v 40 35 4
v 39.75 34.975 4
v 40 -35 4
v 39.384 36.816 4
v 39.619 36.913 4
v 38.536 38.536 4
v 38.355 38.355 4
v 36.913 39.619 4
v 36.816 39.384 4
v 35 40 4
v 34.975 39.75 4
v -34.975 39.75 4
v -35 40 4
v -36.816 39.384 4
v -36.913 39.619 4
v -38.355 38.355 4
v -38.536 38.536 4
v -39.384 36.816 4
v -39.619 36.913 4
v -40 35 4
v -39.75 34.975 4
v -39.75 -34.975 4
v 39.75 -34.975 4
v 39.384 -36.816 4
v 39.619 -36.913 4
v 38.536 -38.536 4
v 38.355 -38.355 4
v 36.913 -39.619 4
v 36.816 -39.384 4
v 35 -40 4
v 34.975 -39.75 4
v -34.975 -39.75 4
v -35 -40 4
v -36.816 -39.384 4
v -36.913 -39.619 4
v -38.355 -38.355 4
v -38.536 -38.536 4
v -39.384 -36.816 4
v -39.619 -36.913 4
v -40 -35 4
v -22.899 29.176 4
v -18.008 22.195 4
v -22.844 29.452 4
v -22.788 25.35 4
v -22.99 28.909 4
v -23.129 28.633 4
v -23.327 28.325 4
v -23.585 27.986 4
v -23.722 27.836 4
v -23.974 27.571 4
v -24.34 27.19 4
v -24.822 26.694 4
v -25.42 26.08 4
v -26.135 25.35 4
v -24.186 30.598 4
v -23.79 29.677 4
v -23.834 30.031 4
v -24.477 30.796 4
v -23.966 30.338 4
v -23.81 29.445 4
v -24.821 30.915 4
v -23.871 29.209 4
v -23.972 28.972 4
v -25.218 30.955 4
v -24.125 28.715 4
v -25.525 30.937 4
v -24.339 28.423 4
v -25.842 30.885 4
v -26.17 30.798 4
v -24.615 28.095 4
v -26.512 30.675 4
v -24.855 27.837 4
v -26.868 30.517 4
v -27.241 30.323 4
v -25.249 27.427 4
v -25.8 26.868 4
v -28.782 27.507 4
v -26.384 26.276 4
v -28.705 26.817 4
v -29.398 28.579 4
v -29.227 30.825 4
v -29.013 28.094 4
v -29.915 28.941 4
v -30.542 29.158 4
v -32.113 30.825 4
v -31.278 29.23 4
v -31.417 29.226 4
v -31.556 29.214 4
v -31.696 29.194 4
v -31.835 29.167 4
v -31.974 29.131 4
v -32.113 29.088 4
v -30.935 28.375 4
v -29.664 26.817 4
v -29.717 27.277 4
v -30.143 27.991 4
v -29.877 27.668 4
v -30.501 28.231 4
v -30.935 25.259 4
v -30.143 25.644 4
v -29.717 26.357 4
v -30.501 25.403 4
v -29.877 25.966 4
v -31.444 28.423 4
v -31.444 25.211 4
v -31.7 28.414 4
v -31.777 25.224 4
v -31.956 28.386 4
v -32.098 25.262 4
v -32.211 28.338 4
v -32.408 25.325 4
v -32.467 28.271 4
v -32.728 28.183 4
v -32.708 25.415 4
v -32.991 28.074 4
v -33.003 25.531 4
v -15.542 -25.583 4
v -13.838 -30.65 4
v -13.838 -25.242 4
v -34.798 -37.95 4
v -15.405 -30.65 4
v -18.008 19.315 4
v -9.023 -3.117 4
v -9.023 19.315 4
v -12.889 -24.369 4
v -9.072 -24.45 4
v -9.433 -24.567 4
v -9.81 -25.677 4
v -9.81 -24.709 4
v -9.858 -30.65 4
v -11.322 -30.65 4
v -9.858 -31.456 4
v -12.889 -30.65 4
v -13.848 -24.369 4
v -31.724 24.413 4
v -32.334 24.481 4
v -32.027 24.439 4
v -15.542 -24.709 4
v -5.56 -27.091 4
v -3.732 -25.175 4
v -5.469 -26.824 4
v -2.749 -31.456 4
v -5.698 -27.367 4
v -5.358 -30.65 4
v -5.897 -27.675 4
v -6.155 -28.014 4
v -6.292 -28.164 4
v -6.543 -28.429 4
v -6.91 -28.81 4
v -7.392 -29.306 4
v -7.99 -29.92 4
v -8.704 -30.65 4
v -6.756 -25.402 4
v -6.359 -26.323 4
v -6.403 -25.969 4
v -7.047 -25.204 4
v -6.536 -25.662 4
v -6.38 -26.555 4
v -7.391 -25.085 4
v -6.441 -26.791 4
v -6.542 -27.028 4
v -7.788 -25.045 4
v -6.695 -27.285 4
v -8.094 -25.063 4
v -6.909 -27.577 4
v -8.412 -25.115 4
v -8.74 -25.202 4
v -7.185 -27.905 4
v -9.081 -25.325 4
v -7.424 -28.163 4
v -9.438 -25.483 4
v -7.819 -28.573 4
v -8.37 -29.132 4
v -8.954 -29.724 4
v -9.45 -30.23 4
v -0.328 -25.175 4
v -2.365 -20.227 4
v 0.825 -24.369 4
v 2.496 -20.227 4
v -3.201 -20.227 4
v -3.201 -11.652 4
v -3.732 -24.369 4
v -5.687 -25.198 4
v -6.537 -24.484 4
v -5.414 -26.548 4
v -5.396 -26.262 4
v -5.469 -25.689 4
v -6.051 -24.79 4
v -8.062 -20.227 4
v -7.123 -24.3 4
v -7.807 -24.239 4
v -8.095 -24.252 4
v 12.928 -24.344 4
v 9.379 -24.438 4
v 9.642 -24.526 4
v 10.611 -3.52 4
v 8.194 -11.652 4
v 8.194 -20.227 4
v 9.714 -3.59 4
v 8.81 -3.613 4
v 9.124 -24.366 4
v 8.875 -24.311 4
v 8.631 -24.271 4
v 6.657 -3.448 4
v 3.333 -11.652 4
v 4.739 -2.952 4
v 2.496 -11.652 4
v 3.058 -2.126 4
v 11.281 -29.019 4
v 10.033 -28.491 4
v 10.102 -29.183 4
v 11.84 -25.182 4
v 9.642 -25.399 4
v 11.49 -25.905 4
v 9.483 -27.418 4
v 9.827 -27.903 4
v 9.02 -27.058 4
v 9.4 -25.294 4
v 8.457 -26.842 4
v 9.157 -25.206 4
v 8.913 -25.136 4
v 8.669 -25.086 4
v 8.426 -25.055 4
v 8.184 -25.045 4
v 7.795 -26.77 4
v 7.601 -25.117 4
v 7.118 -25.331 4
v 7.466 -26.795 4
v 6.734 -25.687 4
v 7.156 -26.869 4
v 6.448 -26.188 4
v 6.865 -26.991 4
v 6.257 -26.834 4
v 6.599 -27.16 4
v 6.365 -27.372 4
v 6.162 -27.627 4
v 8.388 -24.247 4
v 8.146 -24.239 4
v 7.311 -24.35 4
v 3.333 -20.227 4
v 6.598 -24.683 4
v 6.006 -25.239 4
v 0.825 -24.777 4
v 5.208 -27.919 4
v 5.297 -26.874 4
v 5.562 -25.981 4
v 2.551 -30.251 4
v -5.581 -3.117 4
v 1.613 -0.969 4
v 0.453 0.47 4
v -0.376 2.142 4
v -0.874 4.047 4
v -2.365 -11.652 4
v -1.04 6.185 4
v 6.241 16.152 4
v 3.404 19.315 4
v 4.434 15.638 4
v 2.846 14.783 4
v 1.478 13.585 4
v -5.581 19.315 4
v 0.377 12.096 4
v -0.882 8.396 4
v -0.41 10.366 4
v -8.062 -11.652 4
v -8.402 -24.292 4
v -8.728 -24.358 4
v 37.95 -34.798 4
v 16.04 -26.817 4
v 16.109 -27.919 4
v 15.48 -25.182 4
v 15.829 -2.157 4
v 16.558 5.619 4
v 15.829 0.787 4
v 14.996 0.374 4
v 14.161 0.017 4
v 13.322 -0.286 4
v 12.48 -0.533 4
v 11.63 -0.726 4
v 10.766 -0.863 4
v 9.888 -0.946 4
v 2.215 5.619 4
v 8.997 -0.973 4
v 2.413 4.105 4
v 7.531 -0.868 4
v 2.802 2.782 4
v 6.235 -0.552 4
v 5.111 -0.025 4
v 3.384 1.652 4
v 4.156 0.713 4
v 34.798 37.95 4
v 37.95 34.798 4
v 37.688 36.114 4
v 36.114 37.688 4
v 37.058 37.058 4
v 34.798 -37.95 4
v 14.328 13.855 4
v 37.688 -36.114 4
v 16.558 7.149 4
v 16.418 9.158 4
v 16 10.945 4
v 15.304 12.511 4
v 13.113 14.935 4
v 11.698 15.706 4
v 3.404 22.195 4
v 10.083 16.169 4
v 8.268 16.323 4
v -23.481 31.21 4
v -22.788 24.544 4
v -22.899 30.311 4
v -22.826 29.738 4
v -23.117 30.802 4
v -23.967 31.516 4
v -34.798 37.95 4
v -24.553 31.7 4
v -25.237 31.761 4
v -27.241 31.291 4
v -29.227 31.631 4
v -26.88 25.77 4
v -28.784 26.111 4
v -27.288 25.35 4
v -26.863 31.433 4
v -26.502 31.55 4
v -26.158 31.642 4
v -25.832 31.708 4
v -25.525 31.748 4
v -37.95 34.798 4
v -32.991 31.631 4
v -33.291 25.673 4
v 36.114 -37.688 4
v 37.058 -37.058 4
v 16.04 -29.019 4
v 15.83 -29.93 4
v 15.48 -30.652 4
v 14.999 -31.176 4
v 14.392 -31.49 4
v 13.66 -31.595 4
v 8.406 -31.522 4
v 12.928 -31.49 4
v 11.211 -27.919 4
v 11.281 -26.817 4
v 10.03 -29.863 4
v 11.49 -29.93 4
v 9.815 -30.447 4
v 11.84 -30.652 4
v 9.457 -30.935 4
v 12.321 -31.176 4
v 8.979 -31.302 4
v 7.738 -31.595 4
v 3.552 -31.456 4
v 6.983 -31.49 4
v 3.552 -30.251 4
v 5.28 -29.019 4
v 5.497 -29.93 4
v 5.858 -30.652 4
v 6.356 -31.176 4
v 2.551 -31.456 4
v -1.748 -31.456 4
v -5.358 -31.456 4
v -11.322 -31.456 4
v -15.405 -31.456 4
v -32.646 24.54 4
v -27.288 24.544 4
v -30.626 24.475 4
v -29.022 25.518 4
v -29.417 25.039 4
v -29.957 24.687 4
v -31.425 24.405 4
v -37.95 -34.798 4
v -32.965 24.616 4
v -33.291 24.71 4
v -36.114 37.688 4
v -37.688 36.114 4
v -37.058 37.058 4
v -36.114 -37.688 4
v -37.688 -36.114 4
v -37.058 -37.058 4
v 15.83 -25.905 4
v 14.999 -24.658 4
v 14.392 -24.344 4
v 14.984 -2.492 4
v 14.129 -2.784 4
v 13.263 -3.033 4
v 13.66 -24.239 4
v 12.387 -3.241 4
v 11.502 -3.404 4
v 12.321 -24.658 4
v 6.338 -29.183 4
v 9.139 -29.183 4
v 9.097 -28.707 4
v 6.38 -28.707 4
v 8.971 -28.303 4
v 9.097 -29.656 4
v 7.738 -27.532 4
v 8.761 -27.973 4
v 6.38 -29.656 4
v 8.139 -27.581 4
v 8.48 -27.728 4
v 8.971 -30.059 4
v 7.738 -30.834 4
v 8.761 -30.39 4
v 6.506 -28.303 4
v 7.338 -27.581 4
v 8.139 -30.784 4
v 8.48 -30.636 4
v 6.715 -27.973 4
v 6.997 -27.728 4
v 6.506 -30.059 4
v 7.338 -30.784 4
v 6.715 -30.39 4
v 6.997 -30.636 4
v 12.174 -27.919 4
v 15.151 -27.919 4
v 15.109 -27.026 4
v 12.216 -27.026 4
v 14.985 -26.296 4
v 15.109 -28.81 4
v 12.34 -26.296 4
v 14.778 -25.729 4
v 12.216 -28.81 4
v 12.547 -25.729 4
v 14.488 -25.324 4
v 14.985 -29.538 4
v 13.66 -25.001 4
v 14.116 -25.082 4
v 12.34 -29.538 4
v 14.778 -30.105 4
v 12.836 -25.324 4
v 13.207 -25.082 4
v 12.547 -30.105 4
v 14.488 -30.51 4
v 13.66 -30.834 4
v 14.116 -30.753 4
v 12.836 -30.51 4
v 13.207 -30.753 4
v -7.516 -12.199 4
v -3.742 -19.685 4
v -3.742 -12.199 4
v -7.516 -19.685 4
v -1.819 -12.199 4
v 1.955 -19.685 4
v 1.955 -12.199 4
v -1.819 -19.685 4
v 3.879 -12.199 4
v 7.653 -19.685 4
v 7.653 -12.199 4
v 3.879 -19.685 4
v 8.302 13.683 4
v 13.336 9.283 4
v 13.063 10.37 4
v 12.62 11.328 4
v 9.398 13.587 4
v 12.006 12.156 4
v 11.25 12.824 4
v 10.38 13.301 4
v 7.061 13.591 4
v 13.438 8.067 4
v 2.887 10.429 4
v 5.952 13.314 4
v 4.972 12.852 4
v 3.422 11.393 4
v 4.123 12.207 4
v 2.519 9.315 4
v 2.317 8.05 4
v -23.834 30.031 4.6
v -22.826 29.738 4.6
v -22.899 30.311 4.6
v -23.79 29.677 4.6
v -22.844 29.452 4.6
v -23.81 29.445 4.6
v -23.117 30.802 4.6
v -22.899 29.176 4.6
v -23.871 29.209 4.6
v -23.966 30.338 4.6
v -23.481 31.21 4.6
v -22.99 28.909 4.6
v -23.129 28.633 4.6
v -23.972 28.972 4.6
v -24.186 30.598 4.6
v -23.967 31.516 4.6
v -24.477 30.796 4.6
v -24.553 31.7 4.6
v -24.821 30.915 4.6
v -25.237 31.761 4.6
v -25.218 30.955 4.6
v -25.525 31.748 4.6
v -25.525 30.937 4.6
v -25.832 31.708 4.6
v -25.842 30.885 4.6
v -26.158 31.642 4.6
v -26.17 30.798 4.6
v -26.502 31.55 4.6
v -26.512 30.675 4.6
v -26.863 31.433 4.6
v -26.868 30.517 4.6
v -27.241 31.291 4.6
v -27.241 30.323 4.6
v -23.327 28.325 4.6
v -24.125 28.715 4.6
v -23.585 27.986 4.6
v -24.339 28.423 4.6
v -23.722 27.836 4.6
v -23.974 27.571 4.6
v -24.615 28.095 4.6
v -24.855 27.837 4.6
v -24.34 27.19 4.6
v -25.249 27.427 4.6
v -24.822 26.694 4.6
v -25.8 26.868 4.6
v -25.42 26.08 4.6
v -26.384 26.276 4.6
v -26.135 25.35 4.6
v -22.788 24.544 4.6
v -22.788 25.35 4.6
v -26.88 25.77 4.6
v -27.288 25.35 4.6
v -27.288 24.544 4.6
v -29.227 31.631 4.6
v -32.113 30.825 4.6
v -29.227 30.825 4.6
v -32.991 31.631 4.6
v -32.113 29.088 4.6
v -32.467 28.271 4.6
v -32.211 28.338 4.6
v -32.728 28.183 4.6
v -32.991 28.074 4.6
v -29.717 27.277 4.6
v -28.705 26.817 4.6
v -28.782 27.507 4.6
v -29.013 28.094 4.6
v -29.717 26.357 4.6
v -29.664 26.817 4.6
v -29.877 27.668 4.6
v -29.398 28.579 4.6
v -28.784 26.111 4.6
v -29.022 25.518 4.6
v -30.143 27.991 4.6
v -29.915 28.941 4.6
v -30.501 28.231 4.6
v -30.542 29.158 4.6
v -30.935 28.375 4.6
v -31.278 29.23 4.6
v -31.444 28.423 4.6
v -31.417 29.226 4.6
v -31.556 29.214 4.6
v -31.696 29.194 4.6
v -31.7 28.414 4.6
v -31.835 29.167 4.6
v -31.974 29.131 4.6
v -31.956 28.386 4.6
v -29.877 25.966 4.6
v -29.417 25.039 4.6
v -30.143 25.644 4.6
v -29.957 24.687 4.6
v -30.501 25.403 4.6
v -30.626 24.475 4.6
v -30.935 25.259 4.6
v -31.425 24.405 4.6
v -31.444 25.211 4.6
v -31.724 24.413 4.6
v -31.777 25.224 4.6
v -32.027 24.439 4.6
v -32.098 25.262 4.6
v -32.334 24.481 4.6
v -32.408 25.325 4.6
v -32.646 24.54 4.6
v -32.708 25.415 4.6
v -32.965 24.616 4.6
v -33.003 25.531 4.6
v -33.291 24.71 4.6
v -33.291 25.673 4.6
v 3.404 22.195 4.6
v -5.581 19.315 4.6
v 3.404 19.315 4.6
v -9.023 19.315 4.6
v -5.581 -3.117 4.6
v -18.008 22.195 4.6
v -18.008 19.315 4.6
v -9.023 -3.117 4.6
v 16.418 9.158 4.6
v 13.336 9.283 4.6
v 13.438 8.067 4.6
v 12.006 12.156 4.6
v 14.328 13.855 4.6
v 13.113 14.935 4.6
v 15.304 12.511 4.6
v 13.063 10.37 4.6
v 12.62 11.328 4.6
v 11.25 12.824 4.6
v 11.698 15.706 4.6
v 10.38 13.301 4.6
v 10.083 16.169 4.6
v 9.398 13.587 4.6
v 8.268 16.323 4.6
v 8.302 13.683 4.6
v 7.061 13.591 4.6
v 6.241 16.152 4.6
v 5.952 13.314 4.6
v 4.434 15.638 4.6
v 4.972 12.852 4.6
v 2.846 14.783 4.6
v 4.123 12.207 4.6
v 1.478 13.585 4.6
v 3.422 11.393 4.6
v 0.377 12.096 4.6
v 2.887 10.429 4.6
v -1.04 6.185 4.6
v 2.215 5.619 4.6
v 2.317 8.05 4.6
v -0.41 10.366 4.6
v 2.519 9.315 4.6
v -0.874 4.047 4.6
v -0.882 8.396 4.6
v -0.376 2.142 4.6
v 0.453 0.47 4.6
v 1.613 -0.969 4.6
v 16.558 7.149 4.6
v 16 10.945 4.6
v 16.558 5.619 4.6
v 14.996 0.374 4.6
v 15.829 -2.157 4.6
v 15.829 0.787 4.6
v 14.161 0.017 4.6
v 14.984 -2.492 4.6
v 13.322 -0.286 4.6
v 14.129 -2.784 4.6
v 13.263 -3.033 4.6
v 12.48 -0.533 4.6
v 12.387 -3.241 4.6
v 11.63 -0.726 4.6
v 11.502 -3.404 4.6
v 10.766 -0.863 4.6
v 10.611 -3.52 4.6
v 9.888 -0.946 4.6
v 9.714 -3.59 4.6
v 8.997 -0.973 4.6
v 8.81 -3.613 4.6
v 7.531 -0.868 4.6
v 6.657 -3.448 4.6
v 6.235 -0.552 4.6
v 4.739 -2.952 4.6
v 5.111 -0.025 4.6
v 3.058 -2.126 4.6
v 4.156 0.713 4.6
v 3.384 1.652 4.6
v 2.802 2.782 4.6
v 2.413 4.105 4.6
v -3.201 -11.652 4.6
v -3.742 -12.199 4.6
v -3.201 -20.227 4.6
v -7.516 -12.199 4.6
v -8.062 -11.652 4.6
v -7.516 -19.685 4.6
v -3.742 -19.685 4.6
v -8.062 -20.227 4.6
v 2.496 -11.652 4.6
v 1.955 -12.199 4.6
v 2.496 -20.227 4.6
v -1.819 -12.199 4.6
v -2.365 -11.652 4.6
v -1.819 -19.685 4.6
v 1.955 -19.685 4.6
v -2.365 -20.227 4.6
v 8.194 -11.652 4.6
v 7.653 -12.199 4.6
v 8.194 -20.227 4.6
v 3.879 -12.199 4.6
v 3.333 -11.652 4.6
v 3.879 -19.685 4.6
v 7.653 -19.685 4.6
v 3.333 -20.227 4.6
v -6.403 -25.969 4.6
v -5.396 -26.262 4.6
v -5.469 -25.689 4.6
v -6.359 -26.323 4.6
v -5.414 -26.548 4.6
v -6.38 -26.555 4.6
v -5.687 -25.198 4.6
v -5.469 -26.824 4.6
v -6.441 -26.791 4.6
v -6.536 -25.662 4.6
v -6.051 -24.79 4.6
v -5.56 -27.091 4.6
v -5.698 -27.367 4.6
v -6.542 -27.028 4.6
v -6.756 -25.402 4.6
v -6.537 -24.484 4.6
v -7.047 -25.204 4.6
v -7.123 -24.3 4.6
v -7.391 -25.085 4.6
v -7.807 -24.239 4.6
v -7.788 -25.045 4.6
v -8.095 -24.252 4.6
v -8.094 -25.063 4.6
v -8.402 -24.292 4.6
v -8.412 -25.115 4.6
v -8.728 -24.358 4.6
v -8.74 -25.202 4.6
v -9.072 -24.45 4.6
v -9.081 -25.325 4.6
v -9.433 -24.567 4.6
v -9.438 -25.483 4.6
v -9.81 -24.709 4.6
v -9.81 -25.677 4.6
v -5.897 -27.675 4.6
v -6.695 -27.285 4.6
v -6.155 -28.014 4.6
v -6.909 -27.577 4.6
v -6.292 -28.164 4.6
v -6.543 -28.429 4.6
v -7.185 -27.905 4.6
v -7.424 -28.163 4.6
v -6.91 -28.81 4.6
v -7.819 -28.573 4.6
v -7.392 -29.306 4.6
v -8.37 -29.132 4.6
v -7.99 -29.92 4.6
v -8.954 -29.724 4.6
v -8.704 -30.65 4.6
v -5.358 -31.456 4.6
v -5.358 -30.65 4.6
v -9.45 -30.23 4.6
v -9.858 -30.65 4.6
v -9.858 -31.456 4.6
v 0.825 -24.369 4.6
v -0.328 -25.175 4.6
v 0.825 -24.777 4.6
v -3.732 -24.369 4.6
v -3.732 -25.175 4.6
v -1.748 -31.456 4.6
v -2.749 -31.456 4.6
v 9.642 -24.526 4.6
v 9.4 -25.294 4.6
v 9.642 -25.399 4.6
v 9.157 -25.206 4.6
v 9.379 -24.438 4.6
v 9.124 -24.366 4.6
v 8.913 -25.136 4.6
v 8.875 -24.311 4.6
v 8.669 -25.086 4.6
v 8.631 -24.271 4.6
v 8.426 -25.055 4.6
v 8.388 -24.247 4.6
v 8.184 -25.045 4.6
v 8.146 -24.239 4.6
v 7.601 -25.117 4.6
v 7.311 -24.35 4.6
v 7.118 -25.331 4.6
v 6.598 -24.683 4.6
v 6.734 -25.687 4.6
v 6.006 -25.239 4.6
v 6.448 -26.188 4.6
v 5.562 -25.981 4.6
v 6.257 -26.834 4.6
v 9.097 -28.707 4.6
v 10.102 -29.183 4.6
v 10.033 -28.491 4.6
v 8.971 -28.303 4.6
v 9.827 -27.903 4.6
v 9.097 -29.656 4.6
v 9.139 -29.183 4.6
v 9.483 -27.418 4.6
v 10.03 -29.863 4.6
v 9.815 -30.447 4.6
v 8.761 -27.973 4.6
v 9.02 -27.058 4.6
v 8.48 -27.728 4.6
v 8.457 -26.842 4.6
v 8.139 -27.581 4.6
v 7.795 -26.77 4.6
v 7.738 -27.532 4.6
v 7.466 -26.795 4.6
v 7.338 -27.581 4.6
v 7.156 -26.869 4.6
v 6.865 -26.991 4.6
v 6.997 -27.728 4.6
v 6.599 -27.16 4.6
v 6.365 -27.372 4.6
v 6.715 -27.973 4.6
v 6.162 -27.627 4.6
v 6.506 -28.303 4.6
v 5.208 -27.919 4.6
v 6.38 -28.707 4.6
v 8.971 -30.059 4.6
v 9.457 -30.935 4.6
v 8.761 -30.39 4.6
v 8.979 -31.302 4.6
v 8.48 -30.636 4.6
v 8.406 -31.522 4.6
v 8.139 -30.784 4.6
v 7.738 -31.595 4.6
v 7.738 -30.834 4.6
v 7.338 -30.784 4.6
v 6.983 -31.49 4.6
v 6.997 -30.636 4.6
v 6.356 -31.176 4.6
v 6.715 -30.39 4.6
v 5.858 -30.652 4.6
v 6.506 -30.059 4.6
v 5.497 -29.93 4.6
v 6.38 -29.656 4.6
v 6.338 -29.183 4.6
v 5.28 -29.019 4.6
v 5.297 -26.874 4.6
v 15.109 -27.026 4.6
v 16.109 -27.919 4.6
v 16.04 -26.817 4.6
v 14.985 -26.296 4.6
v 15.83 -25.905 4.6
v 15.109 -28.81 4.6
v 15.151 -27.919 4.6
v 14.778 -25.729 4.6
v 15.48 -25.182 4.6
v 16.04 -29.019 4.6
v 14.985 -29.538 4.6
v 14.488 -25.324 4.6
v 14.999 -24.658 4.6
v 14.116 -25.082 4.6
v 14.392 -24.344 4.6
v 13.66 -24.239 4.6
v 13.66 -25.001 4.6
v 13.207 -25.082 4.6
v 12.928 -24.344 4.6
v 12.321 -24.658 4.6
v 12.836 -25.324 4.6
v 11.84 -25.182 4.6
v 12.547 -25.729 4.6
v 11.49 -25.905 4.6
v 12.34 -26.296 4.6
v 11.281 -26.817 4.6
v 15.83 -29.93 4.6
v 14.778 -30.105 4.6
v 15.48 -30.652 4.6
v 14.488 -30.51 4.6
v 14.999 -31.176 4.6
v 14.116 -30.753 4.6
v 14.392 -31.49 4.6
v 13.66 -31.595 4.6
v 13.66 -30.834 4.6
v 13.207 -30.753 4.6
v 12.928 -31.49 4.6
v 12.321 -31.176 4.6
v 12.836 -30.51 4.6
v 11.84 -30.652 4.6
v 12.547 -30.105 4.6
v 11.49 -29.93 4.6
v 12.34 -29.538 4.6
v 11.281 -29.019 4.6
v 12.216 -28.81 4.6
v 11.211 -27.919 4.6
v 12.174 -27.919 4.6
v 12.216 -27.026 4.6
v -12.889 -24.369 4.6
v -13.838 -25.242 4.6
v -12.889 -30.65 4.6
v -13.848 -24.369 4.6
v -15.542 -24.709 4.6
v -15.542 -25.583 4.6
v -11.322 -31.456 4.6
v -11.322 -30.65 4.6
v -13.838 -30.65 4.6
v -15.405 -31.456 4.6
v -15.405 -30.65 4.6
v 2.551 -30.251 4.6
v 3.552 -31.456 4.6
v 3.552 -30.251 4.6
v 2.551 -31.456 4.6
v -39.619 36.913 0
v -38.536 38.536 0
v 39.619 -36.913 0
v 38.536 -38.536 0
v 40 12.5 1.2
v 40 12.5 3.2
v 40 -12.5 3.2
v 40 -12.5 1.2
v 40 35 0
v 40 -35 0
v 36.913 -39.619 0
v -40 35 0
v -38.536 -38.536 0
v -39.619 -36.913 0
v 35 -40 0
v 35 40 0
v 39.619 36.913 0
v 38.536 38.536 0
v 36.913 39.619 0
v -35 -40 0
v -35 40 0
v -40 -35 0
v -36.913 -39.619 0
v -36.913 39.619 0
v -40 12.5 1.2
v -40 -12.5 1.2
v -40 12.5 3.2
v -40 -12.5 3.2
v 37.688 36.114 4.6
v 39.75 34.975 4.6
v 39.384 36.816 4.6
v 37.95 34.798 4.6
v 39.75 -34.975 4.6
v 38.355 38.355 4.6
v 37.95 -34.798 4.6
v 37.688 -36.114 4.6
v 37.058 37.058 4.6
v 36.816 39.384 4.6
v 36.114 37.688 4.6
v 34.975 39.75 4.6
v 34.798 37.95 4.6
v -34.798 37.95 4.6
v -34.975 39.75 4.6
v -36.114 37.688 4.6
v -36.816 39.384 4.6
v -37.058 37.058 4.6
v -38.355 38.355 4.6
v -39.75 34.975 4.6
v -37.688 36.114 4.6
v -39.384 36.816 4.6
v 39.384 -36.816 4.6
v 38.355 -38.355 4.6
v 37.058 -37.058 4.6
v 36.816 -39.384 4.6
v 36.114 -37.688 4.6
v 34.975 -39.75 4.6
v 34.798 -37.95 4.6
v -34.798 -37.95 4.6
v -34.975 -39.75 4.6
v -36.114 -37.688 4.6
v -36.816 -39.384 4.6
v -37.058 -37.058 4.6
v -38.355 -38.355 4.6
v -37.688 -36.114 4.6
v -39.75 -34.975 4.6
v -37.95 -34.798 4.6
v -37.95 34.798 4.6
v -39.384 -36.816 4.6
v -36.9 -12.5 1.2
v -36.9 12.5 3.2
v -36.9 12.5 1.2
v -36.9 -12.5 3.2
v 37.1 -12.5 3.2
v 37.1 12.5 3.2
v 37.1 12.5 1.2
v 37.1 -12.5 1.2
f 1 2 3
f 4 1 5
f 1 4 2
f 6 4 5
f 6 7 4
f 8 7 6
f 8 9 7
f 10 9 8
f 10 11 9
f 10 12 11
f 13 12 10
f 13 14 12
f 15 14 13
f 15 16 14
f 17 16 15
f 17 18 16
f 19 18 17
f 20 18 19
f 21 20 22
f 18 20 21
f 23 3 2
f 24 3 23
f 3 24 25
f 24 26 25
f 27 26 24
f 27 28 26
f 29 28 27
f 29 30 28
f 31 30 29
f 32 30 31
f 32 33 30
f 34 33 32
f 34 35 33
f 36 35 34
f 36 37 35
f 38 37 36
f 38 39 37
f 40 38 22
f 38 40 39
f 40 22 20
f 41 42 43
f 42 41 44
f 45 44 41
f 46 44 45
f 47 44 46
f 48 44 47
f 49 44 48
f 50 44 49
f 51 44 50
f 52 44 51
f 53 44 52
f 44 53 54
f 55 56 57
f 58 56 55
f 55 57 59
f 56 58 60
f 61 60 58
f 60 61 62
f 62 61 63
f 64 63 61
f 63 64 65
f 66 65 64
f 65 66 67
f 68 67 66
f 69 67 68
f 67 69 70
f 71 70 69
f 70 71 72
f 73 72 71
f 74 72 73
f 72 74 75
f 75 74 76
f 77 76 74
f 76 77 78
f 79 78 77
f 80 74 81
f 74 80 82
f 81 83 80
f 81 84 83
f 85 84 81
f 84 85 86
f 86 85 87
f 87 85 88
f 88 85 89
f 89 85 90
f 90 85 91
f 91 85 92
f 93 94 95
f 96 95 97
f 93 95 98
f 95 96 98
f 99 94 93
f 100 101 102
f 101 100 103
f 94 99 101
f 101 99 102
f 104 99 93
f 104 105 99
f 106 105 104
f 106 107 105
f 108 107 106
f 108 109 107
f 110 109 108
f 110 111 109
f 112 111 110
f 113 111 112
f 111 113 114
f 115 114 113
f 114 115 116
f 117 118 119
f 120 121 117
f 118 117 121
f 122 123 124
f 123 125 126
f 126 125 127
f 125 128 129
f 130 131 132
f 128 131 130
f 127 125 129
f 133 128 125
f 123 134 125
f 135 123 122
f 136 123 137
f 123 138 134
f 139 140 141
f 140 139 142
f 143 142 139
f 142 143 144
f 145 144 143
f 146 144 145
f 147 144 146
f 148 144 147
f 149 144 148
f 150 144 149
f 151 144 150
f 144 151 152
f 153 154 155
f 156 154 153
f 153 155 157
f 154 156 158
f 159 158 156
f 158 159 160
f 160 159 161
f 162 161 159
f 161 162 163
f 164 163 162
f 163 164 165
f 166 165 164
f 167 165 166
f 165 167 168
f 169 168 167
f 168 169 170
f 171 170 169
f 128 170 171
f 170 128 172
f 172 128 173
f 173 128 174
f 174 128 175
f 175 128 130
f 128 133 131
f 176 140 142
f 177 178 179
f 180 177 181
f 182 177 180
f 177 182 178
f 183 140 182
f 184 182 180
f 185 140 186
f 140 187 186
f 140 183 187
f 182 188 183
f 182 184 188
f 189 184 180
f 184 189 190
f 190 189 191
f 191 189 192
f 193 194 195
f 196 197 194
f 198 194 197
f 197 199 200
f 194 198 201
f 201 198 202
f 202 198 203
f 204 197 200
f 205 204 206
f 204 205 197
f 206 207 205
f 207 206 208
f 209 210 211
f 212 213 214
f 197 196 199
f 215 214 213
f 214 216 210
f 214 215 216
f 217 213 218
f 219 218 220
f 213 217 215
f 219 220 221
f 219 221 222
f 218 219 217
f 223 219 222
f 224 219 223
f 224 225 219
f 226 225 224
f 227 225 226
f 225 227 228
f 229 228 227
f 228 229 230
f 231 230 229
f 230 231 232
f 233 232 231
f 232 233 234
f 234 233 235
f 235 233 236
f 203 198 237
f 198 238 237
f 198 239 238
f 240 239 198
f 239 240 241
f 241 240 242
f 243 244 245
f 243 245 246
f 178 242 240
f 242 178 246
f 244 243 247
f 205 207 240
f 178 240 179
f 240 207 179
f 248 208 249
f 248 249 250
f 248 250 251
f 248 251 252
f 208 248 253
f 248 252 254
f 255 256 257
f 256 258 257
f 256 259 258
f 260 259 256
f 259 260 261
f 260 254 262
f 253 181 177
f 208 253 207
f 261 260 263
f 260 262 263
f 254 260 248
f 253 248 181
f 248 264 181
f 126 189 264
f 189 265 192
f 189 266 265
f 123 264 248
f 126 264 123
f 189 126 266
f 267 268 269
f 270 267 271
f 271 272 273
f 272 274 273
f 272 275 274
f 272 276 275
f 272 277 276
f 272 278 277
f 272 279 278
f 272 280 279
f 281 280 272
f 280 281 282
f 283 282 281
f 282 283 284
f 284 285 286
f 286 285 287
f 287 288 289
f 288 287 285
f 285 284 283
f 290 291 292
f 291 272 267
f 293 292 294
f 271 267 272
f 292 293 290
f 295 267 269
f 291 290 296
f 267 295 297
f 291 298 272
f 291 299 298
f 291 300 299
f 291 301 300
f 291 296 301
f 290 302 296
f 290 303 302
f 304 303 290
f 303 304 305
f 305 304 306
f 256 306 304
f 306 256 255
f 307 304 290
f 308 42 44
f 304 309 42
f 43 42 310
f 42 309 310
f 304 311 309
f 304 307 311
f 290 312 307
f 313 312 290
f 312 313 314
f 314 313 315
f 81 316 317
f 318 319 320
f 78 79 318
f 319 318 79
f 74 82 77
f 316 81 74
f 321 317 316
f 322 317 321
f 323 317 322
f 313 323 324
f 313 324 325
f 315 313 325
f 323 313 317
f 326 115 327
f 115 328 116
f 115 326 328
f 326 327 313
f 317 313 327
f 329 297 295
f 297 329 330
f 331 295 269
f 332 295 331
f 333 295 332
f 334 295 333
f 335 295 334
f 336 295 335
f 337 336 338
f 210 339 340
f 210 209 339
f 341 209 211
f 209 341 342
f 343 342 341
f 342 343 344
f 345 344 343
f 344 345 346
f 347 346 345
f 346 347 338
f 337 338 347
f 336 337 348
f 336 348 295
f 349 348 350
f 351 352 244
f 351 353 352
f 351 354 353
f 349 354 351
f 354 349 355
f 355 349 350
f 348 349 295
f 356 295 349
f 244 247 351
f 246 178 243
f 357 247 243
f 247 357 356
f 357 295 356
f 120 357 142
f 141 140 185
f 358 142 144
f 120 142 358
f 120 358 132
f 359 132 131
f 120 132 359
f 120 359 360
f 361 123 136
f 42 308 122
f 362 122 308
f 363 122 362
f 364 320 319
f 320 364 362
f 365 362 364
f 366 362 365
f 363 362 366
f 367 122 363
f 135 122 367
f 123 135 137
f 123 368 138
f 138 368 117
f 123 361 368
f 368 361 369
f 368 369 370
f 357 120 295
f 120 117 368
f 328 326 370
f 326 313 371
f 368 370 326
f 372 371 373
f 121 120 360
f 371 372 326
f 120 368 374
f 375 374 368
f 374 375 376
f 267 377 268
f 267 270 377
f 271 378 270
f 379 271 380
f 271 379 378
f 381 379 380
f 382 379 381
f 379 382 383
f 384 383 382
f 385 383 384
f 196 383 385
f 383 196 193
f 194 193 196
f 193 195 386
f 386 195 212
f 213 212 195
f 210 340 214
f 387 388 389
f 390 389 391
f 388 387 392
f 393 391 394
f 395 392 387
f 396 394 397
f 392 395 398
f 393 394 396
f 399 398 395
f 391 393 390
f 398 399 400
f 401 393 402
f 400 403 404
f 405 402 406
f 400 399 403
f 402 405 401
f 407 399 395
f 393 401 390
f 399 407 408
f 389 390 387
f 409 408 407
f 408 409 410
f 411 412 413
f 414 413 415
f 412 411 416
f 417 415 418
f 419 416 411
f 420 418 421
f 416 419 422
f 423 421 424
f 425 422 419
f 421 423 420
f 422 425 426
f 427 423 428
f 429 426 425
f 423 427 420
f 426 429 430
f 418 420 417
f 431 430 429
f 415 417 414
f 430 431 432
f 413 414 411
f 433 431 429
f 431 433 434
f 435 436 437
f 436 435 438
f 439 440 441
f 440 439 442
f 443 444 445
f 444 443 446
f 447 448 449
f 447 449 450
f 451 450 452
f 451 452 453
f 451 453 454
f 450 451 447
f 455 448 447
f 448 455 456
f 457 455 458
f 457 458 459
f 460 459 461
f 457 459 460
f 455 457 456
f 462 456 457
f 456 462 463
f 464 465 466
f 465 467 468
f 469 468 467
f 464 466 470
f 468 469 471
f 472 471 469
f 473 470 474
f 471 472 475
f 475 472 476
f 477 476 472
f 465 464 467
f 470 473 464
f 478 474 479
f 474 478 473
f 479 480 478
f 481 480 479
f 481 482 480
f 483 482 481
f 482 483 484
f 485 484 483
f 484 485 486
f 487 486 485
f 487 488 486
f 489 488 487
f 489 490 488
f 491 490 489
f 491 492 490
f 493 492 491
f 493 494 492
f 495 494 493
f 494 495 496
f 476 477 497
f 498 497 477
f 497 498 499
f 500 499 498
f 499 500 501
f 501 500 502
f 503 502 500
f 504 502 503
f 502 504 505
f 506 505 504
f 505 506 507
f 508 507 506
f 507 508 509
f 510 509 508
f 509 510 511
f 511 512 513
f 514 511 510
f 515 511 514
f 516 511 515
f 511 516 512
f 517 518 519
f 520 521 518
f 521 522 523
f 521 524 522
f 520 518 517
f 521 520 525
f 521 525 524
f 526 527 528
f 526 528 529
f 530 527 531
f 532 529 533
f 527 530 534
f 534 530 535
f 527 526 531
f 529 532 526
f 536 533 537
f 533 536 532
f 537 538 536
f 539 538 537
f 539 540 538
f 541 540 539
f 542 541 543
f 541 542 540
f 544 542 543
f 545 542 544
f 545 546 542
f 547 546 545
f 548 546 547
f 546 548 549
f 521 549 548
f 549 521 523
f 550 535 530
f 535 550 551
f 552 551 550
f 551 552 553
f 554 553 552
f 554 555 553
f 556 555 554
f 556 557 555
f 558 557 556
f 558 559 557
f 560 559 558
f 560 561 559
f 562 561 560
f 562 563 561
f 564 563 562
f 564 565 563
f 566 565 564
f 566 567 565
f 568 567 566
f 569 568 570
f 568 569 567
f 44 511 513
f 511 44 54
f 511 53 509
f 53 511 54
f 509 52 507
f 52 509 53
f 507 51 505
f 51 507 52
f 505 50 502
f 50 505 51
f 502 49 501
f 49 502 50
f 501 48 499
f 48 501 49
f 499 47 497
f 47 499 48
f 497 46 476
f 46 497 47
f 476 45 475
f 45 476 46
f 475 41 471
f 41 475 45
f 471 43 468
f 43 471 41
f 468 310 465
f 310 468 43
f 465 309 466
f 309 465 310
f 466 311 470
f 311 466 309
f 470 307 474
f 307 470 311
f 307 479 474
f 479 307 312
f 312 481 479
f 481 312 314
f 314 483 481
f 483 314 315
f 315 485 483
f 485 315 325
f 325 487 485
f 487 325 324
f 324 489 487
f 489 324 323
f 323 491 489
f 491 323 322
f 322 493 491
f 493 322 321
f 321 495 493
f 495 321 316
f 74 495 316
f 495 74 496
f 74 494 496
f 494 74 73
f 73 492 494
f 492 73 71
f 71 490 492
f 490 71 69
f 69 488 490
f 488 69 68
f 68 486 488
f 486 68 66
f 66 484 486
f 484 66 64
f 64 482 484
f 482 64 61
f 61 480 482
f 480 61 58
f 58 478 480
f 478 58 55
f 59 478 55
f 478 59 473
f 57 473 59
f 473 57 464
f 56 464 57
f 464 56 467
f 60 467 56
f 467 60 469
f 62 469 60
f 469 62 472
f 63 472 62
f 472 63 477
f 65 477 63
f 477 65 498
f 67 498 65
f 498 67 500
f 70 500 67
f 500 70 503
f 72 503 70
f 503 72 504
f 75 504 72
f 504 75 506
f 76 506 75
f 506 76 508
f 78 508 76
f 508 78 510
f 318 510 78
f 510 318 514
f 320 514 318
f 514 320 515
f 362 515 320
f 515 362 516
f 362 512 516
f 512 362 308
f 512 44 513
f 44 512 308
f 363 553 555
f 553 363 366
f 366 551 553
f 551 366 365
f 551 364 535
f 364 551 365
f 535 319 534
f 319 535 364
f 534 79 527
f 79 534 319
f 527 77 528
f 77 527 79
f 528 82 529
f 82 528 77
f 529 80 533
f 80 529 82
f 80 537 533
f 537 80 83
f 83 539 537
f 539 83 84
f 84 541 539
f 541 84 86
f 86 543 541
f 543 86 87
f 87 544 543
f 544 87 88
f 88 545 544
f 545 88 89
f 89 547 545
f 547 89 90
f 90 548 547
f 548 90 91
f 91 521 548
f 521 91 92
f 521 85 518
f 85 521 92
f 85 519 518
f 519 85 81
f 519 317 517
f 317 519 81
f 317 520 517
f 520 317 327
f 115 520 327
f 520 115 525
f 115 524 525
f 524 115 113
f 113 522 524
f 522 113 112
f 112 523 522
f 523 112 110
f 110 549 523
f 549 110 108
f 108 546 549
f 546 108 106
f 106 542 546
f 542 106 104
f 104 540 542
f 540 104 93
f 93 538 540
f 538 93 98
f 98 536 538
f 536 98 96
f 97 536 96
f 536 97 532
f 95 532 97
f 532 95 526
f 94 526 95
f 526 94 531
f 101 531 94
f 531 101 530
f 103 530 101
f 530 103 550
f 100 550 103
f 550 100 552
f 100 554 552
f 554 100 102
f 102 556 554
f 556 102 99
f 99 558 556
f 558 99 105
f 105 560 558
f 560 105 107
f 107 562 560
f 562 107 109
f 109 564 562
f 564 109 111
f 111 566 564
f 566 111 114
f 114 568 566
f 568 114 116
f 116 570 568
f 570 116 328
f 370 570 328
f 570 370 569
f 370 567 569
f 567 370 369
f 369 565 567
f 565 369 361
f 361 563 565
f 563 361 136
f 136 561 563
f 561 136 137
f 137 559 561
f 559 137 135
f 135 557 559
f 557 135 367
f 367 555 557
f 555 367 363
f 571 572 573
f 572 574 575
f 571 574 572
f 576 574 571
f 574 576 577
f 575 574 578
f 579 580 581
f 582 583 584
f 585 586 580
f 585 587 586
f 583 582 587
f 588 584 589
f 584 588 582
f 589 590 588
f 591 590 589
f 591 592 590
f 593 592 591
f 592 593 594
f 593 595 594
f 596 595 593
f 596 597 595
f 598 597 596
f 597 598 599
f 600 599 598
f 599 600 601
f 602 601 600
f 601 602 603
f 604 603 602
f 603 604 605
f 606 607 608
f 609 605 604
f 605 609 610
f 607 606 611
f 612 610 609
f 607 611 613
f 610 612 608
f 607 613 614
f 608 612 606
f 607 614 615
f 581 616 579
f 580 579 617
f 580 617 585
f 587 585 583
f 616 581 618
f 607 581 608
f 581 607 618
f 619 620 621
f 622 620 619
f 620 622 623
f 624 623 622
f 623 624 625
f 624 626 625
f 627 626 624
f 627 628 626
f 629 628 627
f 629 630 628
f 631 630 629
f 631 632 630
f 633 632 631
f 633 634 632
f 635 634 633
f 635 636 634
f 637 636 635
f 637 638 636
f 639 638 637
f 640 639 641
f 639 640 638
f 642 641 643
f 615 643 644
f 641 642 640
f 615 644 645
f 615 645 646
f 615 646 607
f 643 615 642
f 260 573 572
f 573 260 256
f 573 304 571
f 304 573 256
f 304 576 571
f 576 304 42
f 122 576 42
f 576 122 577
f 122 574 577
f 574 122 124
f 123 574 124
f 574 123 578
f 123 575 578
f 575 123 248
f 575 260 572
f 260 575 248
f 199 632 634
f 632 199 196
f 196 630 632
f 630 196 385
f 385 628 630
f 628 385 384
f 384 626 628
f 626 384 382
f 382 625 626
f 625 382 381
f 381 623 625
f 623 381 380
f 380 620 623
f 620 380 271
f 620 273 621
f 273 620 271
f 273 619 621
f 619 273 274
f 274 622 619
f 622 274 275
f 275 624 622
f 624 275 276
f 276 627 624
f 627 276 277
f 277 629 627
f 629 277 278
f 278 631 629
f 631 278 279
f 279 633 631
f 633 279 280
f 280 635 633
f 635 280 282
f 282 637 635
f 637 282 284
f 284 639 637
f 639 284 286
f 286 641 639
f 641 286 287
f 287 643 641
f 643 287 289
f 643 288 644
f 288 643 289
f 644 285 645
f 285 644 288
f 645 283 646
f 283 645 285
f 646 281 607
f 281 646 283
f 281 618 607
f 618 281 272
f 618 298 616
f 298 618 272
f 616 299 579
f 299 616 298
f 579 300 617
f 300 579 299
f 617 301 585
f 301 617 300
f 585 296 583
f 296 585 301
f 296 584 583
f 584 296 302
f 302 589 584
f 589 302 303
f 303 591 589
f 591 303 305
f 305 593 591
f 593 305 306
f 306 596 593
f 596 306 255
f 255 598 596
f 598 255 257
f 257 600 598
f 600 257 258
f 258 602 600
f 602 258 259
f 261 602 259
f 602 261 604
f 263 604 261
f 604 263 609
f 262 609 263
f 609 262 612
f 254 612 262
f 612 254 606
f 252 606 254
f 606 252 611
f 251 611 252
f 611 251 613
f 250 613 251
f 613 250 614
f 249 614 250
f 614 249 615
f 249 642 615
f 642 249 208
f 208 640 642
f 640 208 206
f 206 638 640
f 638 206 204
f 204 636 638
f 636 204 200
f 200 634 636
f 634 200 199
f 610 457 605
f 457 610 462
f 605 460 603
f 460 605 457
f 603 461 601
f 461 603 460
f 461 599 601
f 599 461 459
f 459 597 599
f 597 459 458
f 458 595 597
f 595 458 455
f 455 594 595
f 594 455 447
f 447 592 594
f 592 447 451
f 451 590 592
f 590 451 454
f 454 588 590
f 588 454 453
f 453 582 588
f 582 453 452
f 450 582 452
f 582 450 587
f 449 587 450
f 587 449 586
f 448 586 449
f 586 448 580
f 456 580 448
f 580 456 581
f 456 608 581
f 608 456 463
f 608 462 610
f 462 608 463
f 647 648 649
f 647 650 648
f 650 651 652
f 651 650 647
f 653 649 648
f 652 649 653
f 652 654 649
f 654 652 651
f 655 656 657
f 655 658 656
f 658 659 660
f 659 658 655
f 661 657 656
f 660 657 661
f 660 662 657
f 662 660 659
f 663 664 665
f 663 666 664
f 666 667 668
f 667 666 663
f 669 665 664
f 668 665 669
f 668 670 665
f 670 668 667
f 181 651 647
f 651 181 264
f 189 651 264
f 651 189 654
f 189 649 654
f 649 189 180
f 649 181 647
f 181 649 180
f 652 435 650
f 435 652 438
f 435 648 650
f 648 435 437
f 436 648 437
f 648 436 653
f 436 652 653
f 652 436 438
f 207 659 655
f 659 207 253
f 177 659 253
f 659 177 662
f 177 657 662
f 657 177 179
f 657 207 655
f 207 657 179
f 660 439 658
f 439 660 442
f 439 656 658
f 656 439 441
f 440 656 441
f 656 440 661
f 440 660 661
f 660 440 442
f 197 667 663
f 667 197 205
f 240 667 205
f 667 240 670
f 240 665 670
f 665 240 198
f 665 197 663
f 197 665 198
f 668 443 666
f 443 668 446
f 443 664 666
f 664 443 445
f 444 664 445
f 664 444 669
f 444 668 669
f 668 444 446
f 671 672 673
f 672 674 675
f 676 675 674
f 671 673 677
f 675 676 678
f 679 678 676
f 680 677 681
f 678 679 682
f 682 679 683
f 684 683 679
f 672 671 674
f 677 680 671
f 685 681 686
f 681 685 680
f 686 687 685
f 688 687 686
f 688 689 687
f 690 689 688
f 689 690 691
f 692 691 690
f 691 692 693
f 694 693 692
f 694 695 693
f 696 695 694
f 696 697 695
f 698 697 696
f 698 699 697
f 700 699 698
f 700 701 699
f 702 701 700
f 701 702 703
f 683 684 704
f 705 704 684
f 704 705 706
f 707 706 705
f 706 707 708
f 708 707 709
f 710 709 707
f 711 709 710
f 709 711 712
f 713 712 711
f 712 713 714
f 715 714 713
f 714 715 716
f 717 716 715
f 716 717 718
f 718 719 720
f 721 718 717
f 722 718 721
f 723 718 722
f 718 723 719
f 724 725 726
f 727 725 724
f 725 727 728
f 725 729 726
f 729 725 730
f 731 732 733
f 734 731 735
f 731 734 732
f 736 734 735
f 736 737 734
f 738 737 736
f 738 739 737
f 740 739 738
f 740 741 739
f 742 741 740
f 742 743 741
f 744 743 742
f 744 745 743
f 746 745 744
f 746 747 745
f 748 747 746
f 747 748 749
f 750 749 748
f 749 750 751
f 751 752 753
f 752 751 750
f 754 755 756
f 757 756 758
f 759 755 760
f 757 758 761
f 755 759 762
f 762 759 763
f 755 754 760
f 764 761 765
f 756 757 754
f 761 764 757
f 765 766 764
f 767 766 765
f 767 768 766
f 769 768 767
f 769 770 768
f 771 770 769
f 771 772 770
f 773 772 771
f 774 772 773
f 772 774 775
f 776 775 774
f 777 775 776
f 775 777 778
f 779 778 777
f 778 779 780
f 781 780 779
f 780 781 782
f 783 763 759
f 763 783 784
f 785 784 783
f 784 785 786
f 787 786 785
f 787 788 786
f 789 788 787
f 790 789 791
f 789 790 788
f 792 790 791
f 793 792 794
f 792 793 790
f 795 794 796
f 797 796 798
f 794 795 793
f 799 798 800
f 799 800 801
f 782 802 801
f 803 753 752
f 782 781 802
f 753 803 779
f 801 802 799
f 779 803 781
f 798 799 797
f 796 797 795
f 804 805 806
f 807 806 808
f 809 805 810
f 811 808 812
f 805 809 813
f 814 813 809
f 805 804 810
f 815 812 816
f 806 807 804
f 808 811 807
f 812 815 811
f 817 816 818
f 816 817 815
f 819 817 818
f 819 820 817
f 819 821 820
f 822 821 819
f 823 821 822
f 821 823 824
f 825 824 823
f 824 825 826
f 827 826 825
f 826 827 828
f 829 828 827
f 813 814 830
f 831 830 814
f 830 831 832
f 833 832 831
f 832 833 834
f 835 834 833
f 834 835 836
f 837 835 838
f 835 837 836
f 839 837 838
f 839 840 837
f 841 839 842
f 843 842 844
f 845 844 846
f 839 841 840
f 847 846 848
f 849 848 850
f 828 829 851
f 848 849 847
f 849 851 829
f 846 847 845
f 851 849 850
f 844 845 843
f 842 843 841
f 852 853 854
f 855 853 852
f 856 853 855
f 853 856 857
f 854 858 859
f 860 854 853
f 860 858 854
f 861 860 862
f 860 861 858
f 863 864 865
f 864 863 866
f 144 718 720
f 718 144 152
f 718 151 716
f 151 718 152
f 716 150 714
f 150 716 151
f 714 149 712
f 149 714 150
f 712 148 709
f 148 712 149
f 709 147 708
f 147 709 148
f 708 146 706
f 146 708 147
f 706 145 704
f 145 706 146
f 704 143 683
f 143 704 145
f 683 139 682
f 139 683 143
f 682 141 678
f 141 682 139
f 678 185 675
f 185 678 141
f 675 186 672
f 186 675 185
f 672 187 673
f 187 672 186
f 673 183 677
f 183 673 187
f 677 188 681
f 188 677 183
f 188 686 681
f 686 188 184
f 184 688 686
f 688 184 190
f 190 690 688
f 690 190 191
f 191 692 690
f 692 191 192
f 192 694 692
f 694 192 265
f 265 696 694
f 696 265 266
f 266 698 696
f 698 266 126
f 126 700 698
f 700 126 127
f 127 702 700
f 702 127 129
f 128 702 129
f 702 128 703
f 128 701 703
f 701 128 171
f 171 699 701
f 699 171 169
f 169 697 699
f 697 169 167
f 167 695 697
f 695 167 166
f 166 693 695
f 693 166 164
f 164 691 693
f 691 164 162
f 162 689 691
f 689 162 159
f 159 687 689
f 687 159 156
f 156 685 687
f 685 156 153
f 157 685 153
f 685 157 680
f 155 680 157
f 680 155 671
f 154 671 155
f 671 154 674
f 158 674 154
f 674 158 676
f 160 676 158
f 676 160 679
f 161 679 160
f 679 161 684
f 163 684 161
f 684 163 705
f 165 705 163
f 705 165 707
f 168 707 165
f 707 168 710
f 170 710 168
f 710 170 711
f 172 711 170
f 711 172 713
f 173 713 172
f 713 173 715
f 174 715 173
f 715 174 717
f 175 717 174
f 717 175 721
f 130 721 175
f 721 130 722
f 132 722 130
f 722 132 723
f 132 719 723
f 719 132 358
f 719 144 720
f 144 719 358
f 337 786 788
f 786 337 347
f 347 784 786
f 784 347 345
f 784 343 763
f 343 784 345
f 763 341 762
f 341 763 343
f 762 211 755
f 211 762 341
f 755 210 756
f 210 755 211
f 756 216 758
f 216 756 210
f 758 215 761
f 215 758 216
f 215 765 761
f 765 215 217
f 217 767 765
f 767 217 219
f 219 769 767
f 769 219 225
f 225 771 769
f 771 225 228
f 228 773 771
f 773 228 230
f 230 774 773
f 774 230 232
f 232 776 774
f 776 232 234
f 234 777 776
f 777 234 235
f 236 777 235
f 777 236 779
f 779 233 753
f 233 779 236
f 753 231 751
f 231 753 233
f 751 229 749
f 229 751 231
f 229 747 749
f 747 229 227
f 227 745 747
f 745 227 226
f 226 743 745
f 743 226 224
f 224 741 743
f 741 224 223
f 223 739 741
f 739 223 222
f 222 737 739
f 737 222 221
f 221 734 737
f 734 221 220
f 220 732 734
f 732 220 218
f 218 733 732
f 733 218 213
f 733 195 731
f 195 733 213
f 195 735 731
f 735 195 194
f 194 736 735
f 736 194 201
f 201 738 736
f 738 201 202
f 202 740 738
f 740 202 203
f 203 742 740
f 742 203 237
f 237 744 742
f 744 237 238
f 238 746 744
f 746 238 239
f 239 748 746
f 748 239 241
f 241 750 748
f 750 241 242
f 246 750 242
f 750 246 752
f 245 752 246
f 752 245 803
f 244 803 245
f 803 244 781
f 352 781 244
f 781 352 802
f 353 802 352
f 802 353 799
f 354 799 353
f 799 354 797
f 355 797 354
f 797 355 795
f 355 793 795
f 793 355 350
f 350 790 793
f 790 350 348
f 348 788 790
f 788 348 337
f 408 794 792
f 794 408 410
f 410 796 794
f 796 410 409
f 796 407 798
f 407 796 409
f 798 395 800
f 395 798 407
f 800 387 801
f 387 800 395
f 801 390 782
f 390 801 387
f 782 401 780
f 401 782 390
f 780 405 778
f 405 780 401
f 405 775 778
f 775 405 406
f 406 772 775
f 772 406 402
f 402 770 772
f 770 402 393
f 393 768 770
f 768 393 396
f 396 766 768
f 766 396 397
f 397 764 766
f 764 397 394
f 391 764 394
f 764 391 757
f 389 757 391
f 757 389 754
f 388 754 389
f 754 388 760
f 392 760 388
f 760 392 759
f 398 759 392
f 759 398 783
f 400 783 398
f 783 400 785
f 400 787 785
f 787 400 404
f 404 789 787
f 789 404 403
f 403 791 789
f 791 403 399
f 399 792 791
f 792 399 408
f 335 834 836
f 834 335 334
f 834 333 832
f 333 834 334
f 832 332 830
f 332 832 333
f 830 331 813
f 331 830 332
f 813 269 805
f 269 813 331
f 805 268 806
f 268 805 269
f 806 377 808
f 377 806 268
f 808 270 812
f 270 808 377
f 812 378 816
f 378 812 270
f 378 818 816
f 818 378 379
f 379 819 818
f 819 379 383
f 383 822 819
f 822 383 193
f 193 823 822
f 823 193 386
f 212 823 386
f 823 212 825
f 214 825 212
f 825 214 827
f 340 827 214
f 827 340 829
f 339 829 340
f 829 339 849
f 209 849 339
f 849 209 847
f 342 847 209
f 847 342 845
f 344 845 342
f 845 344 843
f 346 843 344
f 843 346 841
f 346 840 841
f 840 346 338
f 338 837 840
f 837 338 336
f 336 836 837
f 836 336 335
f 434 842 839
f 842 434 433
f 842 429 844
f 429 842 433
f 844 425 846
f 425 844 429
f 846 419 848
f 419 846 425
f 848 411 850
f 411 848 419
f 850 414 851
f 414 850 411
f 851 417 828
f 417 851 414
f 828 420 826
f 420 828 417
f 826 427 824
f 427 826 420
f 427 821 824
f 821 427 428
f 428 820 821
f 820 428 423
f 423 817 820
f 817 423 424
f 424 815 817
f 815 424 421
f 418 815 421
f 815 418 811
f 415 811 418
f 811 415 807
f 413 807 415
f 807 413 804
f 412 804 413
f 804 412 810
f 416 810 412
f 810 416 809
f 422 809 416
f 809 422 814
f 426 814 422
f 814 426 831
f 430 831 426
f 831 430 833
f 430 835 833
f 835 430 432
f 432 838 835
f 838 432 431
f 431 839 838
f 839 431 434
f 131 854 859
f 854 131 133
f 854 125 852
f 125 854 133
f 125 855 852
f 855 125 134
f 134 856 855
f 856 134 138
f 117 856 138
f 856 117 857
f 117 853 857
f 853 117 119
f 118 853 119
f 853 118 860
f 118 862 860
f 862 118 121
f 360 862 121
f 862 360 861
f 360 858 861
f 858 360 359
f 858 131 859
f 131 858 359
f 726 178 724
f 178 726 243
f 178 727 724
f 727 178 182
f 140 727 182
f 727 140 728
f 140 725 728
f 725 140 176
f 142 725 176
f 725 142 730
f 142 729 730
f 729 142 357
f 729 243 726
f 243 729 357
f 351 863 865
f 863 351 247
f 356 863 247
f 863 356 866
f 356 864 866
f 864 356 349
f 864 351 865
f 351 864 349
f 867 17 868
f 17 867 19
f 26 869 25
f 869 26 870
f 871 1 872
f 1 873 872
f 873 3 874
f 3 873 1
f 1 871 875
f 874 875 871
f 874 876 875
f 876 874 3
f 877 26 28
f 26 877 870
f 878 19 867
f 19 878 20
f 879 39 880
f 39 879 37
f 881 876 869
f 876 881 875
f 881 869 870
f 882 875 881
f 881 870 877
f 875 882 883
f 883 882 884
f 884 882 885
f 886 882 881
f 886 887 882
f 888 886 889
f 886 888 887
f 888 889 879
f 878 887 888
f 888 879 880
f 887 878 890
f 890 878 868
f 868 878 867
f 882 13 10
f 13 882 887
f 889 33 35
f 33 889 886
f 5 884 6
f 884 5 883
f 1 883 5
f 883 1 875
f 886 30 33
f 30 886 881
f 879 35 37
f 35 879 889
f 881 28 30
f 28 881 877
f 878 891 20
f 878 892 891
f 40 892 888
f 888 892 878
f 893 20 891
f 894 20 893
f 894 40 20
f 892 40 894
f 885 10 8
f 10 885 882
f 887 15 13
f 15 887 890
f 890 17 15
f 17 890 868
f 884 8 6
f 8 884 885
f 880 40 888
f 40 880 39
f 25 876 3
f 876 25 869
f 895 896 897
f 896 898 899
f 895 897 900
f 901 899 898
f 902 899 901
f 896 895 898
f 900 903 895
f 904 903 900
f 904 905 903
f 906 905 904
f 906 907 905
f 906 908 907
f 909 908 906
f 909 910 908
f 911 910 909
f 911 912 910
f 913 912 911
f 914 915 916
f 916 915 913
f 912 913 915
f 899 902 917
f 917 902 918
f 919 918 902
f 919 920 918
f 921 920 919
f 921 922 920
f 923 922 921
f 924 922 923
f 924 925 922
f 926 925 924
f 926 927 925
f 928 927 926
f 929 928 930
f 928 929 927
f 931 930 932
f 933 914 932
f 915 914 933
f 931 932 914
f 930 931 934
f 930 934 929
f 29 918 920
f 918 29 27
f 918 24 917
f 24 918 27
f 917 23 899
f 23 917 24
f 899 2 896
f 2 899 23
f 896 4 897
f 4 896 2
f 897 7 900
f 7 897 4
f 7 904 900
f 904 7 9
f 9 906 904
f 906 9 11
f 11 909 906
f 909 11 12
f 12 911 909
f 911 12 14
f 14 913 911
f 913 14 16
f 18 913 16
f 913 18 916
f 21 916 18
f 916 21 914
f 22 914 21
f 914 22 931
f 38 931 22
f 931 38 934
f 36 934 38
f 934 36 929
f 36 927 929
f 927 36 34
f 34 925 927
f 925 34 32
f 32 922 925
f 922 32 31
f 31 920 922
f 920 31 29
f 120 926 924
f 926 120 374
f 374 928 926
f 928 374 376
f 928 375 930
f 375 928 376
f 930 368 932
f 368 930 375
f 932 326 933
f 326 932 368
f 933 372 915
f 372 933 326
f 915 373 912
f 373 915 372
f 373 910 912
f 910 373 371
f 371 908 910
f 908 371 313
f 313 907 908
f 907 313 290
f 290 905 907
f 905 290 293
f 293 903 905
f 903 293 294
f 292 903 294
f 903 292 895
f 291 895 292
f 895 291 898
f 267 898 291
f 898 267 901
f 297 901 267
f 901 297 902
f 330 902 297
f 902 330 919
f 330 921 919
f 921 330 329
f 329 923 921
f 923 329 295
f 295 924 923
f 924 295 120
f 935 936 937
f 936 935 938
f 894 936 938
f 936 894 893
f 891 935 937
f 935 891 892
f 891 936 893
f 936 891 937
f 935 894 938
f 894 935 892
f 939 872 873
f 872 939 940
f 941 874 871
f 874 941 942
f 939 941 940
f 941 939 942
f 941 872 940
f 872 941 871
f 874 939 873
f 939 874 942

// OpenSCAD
// Element tile generator (Korean-friendly)
// Usage from command line:
// openscad -o out/Te.stl -D "symbol='Te'" -D "name='텔루륨'" -D "number='127.60'" -D "atomic_number='52'" element_tiles.scad

symbol = "Te";
name = "텔루륨";
number = "127.60";
atomic_number = "52";

// Choose output piece
show_tile = true;
show_connector = false;

// Use an installed Nanum font. Change if your system uses a different family name.
font_name = "NanumGothic:style=Regular";

// ======================
// Main parameters
// ======================
tile_size = 80;
corner_radius = 5;
base_thickness = 4;

frame_width = 1.8;
frame_height = 0.6;

text_height = 0.6;
symbol_size = 25;
name_size = 7;
number_size = 7;
atomic_size = 7;

// Extra outline thickening applied around every glyph (mm).
// 0 keeps the font's native stroke; small positive values fatten strokes
// for better print legibility / "extra bold" feel.
text_thicken = 0;

slot_width = 25;
slot_height = 2.0;
slot_depth = 3.0;
slot_z = 1.2;

fit_clearance = 0.15;
connector_length = slot_width - 0.2;
connector_height = slot_height - fit_clearance;
connector_depth = 2*(slot_depth - fit_clearance);
connector_gap = 8;
connector_corner = 0.6;

atomic_x = -28;
atomic_y = 28;

symbol_x = 0;
symbol_y = 9;

name_x = 0;
name_y = -16;

number_x = 0;
number_y = -28;

module rounded_square(sz, r) {
    offset(r = r)
        square([sz - 2*r, sz - 2*r], center = true);
}

module outer_shape_2d() {
    rounded_square(tile_size, corner_radius);
}

frame_inset = 0.25;

module outer_frame_2d() {
    difference() {
        offset(delta = -frame_inset)
            outer_shape_2d();
        offset(delta = -(frame_inset + frame_width))
            outer_shape_2d();
    }
}

module base_body() {
    linear_extrude(height = base_thickness)
        outer_shape_2d();
}

module top_outer_frame() {
    translate([0,0,base_thickness])
        linear_extrude(height = frame_height)
            outer_frame_2d();
}

module left_slot() {
    translate([-tile_size/2 - 0.1, -slot_width/2, slot_z])
        cube([slot_depth + 0.2, slot_width, slot_height]);
}

module right_slot() {
    translate([tile_size/2 - slot_depth + 0.1, -slot_width/2, slot_z])
        cube([slot_depth + 0.2, slot_width, slot_height]);
}

module engraved_text(s, sz) {
    offset(r = text_thicken)
        text(s, size = sz, halign = "center", valign = "center", font = font_name);
}

module texts() {
    translate([atomic_x, atomic_y, base_thickness])
        linear_extrude(height = text_height)
            engraved_text(atomic_number, atomic_size);

    translate([symbol_x, symbol_y, base_thickness])
        linear_extrude(height = text_height)
            engraved_text(symbol, symbol_size);

    translate([name_x, name_y, base_thickness])
        linear_extrude(height = text_height)
            engraved_text(name, name_size);

    translate([number_x, number_y, base_thickness])
        linear_extrude(height = text_height)
            engraved_text(number, number_size);
}

module tile() {
    difference() {
        union() {
            base_body();
            top_outer_frame();
            texts();
        }
        left_slot();
        right_slot();
    }
}

module connector() {
    linear_extrude(height = connector_height)
        offset(r = connector_corner)
            square(
                [connector_depth - 2*connector_corner,
                 connector_length - 2*connector_corner],
                center = true
            );
}

if (show_tile)
    tile();

if (show_connector)
    translate([0, -(tile_size/2 + connector_gap), 0])
        rotate([0,0,90])
            connector();
